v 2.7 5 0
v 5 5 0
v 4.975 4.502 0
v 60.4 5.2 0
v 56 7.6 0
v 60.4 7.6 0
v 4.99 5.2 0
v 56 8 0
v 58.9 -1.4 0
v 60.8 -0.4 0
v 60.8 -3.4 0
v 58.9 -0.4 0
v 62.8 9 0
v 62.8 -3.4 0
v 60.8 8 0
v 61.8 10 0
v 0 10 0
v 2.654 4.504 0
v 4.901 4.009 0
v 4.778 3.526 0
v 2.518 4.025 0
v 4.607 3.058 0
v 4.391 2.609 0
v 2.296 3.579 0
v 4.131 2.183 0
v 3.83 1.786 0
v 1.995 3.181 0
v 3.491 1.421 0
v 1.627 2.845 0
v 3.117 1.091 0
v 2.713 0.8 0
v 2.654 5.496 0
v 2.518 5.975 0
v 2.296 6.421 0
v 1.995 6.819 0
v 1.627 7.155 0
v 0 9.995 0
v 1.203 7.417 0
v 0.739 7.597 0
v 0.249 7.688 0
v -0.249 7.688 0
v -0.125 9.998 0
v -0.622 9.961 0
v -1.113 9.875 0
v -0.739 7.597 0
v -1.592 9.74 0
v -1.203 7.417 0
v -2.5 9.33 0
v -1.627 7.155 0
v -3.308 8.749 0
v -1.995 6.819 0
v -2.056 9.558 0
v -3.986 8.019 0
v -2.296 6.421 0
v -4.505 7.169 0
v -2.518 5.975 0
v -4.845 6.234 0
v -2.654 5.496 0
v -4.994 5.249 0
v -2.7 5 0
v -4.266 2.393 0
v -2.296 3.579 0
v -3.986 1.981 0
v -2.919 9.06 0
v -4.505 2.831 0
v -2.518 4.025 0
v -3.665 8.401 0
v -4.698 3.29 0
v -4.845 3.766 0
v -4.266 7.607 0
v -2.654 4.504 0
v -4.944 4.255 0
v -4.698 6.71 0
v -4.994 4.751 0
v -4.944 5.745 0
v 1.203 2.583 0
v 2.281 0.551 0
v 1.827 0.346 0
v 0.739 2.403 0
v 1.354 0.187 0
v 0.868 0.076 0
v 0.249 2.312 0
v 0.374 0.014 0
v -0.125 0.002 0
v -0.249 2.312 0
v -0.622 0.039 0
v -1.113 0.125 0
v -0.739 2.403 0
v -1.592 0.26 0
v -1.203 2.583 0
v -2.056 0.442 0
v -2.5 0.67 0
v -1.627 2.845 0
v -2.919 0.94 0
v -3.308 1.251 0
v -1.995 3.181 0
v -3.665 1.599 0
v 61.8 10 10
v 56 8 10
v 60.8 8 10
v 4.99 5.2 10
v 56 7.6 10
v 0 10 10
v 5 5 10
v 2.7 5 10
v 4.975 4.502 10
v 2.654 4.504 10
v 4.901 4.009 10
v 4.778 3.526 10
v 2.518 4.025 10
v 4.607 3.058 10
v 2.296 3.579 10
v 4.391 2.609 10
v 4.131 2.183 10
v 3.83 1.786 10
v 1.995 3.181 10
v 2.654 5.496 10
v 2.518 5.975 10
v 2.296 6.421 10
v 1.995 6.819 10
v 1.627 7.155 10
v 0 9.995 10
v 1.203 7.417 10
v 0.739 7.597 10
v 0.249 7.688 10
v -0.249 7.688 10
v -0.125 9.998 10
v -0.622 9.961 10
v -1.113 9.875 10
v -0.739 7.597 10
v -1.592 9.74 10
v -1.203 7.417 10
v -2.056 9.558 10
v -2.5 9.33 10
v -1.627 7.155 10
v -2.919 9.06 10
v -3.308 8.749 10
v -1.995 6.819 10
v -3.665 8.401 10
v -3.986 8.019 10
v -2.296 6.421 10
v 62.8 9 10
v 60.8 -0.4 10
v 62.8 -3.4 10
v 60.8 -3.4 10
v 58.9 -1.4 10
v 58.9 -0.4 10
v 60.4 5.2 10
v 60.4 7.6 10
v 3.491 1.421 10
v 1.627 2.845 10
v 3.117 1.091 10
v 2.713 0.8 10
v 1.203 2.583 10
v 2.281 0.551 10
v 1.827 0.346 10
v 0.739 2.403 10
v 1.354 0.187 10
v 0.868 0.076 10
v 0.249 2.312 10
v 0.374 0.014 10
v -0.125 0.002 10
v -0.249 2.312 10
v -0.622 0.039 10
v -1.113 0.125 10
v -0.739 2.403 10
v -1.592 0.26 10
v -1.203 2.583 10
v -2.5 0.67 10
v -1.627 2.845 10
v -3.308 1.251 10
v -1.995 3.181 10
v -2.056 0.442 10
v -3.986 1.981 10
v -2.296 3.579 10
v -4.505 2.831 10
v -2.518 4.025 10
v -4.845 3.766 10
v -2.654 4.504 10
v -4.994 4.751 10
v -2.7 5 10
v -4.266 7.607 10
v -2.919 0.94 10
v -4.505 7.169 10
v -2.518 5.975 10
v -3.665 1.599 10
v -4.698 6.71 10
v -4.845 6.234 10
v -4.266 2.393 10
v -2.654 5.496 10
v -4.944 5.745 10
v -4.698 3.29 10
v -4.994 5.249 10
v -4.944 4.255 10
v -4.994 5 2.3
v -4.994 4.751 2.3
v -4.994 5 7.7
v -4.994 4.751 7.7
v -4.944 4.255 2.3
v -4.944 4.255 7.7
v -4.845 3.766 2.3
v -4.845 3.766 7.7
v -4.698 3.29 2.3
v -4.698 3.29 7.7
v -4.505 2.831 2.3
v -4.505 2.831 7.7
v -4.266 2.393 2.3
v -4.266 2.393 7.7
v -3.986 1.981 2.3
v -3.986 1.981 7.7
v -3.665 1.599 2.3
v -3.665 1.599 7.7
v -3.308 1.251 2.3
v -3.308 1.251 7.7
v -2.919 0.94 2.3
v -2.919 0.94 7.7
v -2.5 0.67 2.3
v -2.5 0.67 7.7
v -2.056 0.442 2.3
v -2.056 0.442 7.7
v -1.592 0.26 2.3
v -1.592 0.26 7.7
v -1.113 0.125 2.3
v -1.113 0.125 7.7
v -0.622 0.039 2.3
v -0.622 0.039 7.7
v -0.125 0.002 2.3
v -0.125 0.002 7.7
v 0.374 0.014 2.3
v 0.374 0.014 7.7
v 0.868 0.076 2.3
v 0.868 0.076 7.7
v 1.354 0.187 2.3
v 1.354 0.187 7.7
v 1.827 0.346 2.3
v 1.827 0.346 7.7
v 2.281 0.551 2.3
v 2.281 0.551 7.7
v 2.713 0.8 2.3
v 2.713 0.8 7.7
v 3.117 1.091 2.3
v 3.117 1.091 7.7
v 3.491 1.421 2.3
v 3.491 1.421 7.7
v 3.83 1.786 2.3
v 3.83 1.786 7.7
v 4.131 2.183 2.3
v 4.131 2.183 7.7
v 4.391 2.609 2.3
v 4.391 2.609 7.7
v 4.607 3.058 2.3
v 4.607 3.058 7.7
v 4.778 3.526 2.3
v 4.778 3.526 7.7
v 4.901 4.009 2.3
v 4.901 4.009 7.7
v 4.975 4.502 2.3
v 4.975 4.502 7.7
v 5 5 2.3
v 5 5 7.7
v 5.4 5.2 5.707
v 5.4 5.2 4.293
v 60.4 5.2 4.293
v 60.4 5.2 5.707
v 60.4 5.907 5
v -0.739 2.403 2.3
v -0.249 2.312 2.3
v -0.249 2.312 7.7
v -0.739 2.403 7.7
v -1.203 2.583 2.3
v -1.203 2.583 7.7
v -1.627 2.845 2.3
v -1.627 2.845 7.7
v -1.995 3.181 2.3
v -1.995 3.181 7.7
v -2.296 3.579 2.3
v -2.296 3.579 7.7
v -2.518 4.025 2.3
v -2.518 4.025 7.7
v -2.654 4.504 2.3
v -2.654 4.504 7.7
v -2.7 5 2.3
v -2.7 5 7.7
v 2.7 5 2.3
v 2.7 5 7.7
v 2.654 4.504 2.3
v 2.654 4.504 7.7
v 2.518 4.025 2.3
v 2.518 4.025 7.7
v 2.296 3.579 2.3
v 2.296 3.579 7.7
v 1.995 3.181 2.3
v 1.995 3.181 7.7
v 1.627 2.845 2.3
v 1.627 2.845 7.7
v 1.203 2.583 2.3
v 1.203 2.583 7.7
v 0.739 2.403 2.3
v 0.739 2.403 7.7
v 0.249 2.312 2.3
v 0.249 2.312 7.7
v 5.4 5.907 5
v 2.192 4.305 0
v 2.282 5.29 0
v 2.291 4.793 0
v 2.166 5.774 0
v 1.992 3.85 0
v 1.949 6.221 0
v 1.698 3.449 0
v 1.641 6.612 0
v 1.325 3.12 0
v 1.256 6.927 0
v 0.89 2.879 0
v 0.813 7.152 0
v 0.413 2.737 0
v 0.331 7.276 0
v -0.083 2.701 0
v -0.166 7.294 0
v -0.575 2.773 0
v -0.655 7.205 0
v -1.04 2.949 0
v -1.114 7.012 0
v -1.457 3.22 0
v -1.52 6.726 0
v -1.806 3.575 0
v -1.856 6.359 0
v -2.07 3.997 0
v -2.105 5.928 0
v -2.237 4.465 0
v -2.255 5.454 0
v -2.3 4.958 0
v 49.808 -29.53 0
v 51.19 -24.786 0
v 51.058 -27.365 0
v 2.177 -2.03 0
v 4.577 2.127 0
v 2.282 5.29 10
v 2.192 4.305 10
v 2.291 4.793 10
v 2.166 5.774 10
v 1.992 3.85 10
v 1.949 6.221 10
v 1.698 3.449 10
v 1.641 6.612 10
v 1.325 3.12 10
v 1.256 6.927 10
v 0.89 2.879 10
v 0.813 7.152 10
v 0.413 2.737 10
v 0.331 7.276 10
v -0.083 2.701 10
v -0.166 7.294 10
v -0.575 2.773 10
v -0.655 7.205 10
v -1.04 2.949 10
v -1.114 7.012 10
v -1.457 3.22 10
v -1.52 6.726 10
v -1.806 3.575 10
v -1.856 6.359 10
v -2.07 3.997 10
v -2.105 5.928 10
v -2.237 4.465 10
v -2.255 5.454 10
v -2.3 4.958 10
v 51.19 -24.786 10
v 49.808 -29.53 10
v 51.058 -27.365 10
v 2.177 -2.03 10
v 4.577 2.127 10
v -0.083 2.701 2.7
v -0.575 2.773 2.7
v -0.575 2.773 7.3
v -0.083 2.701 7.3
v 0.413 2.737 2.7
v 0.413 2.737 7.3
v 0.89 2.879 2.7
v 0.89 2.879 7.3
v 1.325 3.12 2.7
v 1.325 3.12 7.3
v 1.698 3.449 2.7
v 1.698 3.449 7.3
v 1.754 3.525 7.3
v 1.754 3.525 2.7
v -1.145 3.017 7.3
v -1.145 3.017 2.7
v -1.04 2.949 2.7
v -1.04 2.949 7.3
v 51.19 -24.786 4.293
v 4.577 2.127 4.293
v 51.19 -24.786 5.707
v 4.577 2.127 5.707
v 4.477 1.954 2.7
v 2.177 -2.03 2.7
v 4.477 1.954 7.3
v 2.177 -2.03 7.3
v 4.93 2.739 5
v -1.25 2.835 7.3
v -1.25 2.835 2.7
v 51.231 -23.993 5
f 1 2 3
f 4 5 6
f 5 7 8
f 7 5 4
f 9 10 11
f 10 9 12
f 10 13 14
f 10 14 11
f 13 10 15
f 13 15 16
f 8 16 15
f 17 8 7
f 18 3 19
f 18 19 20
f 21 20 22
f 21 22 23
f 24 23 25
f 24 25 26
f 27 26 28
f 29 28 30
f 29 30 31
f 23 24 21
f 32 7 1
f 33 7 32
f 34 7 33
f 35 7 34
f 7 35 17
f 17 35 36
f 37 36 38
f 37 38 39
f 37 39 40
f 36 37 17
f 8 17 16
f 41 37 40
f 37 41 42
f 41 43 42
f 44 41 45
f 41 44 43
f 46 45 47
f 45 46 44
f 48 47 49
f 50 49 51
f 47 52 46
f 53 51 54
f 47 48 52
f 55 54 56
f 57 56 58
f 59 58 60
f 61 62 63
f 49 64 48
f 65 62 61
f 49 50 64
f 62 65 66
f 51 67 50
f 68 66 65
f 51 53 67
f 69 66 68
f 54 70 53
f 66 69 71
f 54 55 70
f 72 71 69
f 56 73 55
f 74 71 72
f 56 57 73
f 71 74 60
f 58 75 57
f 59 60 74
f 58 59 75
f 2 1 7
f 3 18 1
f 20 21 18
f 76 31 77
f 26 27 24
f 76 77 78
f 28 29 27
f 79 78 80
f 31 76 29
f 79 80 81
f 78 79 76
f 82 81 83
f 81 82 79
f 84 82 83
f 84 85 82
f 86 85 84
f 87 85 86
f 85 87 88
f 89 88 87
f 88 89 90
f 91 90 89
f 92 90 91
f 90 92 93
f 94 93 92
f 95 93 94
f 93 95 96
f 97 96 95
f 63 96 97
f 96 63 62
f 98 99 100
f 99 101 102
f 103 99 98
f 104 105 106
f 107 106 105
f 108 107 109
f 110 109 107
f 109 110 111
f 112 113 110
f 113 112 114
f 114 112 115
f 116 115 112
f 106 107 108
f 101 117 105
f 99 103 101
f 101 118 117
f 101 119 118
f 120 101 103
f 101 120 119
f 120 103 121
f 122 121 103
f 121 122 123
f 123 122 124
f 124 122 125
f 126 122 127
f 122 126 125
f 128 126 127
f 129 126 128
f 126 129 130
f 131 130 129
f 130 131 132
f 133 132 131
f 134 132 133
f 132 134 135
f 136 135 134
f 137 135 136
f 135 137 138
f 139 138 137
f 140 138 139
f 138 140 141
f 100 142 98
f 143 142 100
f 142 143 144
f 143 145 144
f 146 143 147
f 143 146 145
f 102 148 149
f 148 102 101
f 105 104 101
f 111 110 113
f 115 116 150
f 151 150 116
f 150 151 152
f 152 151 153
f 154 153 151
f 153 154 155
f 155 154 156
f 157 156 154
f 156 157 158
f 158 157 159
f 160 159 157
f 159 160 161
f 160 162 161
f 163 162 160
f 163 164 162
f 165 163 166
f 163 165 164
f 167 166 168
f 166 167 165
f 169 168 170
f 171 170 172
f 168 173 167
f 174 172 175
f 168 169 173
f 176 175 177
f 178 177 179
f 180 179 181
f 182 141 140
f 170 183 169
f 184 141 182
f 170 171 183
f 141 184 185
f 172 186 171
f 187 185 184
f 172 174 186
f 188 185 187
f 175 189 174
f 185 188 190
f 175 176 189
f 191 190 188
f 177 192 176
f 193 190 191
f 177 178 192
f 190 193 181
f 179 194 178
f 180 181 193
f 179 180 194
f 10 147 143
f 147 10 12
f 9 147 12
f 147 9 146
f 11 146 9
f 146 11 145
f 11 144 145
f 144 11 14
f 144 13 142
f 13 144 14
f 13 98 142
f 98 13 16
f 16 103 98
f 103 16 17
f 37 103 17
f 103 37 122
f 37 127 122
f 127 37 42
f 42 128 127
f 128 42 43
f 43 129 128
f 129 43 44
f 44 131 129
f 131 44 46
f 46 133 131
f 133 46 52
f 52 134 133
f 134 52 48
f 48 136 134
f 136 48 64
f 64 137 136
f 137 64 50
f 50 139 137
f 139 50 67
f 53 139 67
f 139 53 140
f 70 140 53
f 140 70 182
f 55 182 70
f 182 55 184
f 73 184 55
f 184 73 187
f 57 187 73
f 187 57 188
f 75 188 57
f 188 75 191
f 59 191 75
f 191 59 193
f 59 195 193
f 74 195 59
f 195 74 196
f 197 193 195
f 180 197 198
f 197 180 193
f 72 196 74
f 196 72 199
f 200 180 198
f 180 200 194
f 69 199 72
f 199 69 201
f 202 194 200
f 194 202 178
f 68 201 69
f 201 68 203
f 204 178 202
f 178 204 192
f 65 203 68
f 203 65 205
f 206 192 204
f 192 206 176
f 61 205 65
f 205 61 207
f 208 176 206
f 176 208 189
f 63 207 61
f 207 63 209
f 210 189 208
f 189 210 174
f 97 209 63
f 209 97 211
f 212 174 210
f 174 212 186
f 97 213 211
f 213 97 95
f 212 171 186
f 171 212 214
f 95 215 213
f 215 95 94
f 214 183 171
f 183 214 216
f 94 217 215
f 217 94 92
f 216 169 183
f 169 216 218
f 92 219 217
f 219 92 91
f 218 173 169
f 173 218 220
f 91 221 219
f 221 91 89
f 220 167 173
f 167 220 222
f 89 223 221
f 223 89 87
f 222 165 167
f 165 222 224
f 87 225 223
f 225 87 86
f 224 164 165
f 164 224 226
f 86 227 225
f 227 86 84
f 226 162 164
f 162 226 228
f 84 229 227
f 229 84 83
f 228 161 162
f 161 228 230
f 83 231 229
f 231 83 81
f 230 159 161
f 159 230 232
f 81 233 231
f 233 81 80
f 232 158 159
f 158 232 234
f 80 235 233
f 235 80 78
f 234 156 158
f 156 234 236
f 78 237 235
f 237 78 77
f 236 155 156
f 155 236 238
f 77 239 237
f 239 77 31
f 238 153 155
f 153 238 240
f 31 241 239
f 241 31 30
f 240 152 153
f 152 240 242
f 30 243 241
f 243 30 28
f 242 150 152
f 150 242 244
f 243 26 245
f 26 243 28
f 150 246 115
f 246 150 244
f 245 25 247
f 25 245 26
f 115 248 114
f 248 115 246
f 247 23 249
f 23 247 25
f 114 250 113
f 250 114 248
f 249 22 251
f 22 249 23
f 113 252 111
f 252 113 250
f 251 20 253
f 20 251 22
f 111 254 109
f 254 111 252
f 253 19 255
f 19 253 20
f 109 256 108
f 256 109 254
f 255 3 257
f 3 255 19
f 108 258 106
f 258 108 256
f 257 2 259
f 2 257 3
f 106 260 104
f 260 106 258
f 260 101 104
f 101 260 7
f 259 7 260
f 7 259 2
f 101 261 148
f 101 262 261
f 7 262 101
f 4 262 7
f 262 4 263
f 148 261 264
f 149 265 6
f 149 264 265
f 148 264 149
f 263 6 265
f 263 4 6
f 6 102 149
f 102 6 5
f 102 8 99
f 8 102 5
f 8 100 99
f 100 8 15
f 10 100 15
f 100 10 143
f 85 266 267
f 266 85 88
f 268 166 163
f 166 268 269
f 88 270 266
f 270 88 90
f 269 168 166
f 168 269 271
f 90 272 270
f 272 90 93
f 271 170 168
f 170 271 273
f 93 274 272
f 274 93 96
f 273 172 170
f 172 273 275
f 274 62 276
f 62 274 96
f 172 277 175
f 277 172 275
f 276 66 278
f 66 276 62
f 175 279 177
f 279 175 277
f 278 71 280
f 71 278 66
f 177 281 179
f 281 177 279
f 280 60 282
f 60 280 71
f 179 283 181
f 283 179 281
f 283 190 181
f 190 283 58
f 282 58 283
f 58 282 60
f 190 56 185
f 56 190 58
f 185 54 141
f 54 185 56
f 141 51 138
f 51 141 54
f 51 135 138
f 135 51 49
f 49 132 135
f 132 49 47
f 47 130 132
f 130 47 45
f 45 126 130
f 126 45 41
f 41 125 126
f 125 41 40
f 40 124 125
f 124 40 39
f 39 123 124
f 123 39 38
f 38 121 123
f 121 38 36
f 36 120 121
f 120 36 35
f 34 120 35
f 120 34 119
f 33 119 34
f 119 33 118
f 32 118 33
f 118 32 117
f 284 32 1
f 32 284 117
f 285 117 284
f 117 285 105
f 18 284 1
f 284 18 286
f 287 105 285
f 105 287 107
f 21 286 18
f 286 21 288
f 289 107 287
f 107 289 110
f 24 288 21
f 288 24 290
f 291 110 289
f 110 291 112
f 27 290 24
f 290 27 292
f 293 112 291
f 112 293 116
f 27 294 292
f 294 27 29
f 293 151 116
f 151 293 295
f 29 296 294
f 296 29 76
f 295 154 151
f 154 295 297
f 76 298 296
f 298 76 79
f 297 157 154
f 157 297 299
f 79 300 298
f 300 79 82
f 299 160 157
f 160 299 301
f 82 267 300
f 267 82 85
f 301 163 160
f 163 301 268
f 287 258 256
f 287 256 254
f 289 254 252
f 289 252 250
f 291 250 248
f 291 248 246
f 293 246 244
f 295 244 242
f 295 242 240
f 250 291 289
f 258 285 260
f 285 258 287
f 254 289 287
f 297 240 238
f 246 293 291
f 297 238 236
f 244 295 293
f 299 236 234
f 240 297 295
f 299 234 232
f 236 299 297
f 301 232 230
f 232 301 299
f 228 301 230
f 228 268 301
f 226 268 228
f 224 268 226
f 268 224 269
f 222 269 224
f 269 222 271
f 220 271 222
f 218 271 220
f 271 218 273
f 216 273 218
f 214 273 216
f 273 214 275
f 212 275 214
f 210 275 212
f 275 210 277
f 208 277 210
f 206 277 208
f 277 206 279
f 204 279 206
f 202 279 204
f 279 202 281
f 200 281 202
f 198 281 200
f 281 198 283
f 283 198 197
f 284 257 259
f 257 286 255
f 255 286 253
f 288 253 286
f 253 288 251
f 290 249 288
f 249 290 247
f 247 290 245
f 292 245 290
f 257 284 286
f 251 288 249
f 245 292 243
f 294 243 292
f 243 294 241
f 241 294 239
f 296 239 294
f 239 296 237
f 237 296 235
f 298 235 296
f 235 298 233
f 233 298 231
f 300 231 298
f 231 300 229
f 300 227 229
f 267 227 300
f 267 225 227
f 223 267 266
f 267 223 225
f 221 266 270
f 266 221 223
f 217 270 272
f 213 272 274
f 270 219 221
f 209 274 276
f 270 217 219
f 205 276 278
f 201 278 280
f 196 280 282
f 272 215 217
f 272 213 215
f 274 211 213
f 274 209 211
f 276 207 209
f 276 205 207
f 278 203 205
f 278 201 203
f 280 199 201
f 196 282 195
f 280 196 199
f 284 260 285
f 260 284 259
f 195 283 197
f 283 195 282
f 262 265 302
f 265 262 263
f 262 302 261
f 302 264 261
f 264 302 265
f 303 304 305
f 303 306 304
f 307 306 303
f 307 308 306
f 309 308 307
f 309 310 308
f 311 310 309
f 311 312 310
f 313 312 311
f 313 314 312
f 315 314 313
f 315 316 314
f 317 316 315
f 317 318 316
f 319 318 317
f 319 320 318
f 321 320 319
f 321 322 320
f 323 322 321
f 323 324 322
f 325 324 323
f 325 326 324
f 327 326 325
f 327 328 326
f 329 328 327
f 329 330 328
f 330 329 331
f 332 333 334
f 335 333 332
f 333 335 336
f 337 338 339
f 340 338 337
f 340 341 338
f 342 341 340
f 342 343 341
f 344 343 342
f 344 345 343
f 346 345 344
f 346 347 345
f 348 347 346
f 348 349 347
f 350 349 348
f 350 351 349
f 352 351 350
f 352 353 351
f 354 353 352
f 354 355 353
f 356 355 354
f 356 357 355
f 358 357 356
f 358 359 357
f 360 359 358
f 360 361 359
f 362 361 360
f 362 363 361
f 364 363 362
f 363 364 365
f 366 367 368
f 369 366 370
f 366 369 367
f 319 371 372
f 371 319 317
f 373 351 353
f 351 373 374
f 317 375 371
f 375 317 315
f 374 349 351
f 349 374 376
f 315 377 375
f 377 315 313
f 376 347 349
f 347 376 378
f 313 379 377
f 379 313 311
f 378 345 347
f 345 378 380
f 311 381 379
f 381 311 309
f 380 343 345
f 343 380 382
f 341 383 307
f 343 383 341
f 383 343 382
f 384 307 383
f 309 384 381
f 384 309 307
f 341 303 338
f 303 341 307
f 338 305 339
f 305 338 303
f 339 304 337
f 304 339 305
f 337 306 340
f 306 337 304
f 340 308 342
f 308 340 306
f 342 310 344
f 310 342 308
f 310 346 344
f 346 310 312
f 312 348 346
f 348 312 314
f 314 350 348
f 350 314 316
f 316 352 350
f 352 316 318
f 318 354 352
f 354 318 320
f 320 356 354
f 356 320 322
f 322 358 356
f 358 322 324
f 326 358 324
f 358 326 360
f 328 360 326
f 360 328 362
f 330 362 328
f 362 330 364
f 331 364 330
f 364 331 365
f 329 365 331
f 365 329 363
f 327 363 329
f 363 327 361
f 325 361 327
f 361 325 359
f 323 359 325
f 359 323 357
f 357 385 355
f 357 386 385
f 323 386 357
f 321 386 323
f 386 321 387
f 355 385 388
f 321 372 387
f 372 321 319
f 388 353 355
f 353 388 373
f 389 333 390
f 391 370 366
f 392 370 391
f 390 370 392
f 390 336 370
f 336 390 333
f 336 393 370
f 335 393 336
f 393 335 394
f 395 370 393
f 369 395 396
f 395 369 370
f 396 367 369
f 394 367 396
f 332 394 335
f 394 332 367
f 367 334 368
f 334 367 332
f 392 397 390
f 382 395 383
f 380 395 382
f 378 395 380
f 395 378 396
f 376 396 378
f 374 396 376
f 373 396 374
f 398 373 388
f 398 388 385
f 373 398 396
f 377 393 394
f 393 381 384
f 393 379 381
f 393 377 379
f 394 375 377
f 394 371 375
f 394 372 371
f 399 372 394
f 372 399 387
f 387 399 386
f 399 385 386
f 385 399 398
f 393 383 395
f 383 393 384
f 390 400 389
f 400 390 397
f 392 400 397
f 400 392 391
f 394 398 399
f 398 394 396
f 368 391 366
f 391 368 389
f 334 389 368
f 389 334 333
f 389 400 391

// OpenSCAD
/******************************************************************************
 *
 *  GLOBALS
 *
 ******************************************************************************/


/* [General] */

// Effective (internal) length of the clip
armLength = 55;
// Should not be less than two times latch arm hickness plus movement gap :)
armThickness = 5;
height = 10;
latchArmThickness = 2; // [1:0.1:3]
// Simply just tollerance, must be positive for movement
latchGap = 0.4; // [0.2:0.05:0.8]
pivotGap = 0.4; // [0.2:0.05:0.8]
// Angle (in degrees) for printing area adjustment
initialArmsAngle = 30; // [15:15:90] 
/* [Hidden] */
$fa = 1;
$fs = 0.5;


/******************************************************************************
 *
 *  EXECUTION
 *
 ******************************************************************************/


lockArm();
freeArm();


/***************************************************************************
 *
 *  DIRECT MODULES
 *
 ******************************************************************************/

module lockArm()
{
    difference()
    {
        linear_extrude(height = height, convexity = 8)
            _lockArmPlane();
        translate([-armThickness - 1, -1, height / 4 - pivotGap / 2])
            cube([2 * armThickness + 1, armThickness + 1, height / 2 + pivotGap]);

        translate([armThickness + latchGap, armThickness + latchGap / 2, height / 2 - sqrt(2) / 2])
            rotate([45, 0, 0])
                cube([armLength, 1, 1]);
    }
}

module freeArm()
{
    translate([0, armThickness, 0])
        rotate([0, 0, -initialArmsAngle]) 
            translate([0, -armThickness, 0])
            {
                difference()
                {
                    union()
                    {
                        linear_extrude(height = height, convexity = 8)
                            _freeArmPlane();
                        translate([0, 0, height / 4 + pivotGap / 2])
                            cube([armThickness + pivotGap, armThickness - latchGap, height / 2 - pivotGap]);
                        translate([armThickness + pivotGap, armThickness - latchGap / 2, height / 2 - sqrt(2) / 2])
                            rotate([45, 0, 0])
                                cube([armLength, 1, 1]);
                    }
                    translate([0, 0, -1])
                        linear_extrude(height = height + 2, convexity = 8)
                            polygon([[-1, -1], [armThickness + pivotGap, 0], [0, armThickness / 2]]);

                    translate([0, 0, -1])
                        linear_extrude(height = height + 2, convexity = 8)
                            polygon([
                                [armLength + armThickness + latchGap, armThickness / 2],
                                [armLength + armThickness + latchGap + 1, armThickness / 2],
                                [armLength + armThickness + latchGap, armThickness + sqrt(2)],
                                [armLength + armThickness + latchGap - latchArmThickness, armThickness + sqrt(2)]
                                ], center = true);
                }
            }
}

/******************************************************************************
 *
 *  HELPER AND COMPONENT MODULES
 *
 ******************************************************************************/

module _freeArmPlane()
{
    translate([0, armThickness, 0])
        circle(armThickness / 2 - pivotGap / 2);
    translate([armThickness + pivotGap, 0, 0])
        square([armLength, armThickness - pivotGap / 2]);
}

 module _lockArmPlane()
 {
    union()
    {
        difference()
        {
            union()
            {
                translate([0, armThickness, 0])
                    circle(armThickness);
                translate([0, armThickness + latchGap / 2, 0])
                    square([armLength + armThickness + latchGap, armThickness - latchGap / 2]);
                translate([armLength + armThickness - 2 * latchArmThickness + latchGap, 2 * armThickness - latchArmThickness, 0])
                    square([3 * latchArmThickness + latchGap, latchArmThickness]);
                translate([armLength + armThickness + 2 * latchGap, - latchGap, 0])
                    square([latchArmThickness, 2 * armThickness + latchGap]);
                polygon([
                    [armLength + armThickness + 2 * latchGap + latchArmThickness, -latchGap],
                    [armLength + armThickness + latchGap - latchArmThickness * 0.75, -latchGap],
                    [armLength + armThickness + latchGap - latchArmThickness * 0.75, -latchGap - latchArmThickness / 2],
                    [armLength + armThickness + 2 * latchGap, -latchGap - latchArmThickness * 1.5],
                    [armLength + armThickness + 2 * latchGap + latchArmThickness, -latchGap - latchArmThickness * 1.5]
                    ]);
            }
            translate([0, armThickness, 0])
                circle(armThickness / 2 + pivotGap / 2);
            translate([armLength + armThickness - 2 * latchArmThickness, armThickness * 2 - latchArmThickness - latchGap, 0])
                square([2 * latchArmThickness + latchGap, latchGap]);
            translate([armLength + armThickness + 2 * latchGap + latchArmThickness, armThickness * 2 - latchArmThickness/2, 0])
                rotate([0, 0, 45])
                    square(latchArmThickness);
            
        }    
    }
 }
